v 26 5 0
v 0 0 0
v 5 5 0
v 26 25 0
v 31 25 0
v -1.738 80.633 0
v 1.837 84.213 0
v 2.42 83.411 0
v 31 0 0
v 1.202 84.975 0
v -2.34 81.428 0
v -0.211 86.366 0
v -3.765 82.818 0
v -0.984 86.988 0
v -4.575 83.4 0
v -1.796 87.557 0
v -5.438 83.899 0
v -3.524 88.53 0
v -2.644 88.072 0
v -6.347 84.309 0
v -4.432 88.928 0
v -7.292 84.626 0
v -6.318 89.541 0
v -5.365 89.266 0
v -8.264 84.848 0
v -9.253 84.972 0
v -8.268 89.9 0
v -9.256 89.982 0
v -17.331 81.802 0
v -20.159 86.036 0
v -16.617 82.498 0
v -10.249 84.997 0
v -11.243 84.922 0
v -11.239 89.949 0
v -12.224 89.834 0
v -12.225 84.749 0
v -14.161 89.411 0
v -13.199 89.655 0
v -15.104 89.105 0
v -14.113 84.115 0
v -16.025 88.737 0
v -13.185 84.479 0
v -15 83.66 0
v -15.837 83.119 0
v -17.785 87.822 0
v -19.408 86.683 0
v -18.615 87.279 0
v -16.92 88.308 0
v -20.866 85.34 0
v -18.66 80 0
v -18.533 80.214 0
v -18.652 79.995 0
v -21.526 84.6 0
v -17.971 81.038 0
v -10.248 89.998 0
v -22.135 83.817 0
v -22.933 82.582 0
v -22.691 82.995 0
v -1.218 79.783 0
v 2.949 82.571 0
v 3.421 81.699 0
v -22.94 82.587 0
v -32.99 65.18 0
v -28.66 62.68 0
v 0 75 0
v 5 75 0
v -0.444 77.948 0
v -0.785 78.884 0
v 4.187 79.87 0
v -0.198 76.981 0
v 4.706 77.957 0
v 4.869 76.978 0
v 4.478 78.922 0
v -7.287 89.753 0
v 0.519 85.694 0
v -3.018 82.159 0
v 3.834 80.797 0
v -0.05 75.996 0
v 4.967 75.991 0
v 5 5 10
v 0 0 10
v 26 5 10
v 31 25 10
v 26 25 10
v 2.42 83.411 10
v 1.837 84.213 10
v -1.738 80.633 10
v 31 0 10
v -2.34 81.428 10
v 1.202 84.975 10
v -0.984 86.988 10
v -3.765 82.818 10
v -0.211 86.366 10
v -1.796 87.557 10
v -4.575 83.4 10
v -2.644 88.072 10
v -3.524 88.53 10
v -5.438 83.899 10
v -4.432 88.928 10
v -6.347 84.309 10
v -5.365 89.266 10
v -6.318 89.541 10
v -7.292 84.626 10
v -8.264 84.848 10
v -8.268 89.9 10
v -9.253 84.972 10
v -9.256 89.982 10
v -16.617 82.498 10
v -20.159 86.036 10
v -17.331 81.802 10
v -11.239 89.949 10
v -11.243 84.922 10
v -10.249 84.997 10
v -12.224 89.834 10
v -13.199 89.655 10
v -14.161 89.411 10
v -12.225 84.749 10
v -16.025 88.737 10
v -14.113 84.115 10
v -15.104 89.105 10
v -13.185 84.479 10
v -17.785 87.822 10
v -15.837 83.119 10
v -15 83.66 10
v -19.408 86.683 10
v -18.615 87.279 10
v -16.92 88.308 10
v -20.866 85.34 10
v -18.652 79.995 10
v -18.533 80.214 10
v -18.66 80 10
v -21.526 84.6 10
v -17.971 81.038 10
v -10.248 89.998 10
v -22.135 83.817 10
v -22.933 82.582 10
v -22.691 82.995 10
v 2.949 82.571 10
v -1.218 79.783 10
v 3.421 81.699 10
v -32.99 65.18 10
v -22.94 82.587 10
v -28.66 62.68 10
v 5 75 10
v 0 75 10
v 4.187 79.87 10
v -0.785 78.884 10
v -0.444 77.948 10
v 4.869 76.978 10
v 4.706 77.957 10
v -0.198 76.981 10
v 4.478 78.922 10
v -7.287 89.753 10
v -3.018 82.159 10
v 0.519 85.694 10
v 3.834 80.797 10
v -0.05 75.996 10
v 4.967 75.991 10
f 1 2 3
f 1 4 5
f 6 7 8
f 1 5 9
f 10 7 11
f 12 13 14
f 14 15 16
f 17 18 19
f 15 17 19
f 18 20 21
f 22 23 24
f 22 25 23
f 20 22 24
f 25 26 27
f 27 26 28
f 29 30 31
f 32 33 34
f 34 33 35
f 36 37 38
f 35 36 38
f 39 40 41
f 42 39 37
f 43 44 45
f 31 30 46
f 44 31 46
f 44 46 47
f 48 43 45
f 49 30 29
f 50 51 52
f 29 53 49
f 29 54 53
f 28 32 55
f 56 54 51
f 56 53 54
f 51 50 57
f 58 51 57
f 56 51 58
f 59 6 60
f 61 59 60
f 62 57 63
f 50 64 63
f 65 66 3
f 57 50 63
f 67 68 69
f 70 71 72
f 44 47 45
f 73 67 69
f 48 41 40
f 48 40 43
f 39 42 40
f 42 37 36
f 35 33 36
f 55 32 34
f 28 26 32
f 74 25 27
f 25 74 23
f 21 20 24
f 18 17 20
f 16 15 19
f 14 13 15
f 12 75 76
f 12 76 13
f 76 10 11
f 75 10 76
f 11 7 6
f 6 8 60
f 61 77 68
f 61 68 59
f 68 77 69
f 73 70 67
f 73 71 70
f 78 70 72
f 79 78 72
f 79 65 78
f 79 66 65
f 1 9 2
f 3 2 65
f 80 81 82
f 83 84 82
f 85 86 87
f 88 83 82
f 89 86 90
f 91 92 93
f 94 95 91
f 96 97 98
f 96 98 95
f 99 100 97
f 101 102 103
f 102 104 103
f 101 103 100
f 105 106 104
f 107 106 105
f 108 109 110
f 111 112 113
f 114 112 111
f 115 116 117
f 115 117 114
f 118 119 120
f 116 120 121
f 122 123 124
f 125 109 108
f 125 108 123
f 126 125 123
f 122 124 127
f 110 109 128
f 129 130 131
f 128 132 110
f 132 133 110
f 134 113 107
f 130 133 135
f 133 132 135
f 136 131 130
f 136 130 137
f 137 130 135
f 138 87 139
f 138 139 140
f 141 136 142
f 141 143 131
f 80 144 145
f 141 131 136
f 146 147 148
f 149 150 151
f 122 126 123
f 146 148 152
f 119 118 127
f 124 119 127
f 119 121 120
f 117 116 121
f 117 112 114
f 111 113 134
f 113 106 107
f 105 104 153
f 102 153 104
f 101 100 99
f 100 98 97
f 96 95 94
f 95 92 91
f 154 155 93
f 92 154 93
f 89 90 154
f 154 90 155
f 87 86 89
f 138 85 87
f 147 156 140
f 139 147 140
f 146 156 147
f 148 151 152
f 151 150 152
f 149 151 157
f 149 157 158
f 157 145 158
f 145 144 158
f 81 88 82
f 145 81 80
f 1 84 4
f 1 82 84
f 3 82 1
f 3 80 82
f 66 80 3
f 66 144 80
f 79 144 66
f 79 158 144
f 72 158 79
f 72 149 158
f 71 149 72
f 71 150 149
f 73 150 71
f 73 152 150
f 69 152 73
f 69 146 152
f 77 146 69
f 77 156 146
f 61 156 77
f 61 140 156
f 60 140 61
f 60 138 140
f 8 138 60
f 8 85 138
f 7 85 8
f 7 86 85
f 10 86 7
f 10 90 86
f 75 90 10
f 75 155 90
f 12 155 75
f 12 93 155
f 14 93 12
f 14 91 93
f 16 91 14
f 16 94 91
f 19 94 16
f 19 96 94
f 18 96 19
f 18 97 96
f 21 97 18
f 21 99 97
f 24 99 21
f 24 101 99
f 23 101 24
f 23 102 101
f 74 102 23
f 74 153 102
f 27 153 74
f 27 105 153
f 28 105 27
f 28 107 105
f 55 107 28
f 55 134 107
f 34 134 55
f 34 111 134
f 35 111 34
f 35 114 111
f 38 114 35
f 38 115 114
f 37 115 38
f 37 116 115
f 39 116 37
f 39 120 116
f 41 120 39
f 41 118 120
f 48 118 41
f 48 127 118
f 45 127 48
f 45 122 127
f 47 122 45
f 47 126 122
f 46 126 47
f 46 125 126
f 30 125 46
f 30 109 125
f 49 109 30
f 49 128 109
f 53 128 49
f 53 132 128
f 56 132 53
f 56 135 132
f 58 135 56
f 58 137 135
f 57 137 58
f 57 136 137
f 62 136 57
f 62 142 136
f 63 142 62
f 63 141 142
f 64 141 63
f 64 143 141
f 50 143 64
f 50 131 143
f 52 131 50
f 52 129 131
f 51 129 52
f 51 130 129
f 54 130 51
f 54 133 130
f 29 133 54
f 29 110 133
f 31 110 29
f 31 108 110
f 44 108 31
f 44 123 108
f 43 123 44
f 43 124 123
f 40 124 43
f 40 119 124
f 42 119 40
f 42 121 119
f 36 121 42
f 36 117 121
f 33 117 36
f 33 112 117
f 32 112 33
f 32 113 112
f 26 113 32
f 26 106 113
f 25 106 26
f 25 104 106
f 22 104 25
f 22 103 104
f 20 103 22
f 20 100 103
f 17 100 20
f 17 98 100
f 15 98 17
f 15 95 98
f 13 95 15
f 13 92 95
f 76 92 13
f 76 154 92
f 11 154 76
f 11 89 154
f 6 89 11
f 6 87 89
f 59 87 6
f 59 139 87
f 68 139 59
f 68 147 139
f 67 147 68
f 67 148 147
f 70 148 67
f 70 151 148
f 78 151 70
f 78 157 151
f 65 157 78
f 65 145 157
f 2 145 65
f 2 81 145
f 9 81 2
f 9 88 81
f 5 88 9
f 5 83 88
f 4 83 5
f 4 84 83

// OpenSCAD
$fa=1;$fs=1;
gap=21;
thick=5;
tip=20;
jaw=70;
pic=20;
r=10;
theta=30;
linear_extrude(10)difference(){
	union(){
		square([gap+thick*2,jaw+thick]);
		translate([-r,jaw+thick]){
			difference(){
				circle(r=r+thick);
				circle(r=r);
				translate([-r-thick,-r-thick])square([(r+thick)*2,r+thick]);
				rotate(-theta)translate([-r-thick,-r-thick])square([(r+thick)*2,r+thick]);
			}
			rotate(-theta)translate([-r-thick,-pic])square([thick,pic+.1]);
		}
	}
	translate([thick,thick])square([gap,jaw]);
	translate([thick,thick+tip])square([gap+thick,jaw]);
}
